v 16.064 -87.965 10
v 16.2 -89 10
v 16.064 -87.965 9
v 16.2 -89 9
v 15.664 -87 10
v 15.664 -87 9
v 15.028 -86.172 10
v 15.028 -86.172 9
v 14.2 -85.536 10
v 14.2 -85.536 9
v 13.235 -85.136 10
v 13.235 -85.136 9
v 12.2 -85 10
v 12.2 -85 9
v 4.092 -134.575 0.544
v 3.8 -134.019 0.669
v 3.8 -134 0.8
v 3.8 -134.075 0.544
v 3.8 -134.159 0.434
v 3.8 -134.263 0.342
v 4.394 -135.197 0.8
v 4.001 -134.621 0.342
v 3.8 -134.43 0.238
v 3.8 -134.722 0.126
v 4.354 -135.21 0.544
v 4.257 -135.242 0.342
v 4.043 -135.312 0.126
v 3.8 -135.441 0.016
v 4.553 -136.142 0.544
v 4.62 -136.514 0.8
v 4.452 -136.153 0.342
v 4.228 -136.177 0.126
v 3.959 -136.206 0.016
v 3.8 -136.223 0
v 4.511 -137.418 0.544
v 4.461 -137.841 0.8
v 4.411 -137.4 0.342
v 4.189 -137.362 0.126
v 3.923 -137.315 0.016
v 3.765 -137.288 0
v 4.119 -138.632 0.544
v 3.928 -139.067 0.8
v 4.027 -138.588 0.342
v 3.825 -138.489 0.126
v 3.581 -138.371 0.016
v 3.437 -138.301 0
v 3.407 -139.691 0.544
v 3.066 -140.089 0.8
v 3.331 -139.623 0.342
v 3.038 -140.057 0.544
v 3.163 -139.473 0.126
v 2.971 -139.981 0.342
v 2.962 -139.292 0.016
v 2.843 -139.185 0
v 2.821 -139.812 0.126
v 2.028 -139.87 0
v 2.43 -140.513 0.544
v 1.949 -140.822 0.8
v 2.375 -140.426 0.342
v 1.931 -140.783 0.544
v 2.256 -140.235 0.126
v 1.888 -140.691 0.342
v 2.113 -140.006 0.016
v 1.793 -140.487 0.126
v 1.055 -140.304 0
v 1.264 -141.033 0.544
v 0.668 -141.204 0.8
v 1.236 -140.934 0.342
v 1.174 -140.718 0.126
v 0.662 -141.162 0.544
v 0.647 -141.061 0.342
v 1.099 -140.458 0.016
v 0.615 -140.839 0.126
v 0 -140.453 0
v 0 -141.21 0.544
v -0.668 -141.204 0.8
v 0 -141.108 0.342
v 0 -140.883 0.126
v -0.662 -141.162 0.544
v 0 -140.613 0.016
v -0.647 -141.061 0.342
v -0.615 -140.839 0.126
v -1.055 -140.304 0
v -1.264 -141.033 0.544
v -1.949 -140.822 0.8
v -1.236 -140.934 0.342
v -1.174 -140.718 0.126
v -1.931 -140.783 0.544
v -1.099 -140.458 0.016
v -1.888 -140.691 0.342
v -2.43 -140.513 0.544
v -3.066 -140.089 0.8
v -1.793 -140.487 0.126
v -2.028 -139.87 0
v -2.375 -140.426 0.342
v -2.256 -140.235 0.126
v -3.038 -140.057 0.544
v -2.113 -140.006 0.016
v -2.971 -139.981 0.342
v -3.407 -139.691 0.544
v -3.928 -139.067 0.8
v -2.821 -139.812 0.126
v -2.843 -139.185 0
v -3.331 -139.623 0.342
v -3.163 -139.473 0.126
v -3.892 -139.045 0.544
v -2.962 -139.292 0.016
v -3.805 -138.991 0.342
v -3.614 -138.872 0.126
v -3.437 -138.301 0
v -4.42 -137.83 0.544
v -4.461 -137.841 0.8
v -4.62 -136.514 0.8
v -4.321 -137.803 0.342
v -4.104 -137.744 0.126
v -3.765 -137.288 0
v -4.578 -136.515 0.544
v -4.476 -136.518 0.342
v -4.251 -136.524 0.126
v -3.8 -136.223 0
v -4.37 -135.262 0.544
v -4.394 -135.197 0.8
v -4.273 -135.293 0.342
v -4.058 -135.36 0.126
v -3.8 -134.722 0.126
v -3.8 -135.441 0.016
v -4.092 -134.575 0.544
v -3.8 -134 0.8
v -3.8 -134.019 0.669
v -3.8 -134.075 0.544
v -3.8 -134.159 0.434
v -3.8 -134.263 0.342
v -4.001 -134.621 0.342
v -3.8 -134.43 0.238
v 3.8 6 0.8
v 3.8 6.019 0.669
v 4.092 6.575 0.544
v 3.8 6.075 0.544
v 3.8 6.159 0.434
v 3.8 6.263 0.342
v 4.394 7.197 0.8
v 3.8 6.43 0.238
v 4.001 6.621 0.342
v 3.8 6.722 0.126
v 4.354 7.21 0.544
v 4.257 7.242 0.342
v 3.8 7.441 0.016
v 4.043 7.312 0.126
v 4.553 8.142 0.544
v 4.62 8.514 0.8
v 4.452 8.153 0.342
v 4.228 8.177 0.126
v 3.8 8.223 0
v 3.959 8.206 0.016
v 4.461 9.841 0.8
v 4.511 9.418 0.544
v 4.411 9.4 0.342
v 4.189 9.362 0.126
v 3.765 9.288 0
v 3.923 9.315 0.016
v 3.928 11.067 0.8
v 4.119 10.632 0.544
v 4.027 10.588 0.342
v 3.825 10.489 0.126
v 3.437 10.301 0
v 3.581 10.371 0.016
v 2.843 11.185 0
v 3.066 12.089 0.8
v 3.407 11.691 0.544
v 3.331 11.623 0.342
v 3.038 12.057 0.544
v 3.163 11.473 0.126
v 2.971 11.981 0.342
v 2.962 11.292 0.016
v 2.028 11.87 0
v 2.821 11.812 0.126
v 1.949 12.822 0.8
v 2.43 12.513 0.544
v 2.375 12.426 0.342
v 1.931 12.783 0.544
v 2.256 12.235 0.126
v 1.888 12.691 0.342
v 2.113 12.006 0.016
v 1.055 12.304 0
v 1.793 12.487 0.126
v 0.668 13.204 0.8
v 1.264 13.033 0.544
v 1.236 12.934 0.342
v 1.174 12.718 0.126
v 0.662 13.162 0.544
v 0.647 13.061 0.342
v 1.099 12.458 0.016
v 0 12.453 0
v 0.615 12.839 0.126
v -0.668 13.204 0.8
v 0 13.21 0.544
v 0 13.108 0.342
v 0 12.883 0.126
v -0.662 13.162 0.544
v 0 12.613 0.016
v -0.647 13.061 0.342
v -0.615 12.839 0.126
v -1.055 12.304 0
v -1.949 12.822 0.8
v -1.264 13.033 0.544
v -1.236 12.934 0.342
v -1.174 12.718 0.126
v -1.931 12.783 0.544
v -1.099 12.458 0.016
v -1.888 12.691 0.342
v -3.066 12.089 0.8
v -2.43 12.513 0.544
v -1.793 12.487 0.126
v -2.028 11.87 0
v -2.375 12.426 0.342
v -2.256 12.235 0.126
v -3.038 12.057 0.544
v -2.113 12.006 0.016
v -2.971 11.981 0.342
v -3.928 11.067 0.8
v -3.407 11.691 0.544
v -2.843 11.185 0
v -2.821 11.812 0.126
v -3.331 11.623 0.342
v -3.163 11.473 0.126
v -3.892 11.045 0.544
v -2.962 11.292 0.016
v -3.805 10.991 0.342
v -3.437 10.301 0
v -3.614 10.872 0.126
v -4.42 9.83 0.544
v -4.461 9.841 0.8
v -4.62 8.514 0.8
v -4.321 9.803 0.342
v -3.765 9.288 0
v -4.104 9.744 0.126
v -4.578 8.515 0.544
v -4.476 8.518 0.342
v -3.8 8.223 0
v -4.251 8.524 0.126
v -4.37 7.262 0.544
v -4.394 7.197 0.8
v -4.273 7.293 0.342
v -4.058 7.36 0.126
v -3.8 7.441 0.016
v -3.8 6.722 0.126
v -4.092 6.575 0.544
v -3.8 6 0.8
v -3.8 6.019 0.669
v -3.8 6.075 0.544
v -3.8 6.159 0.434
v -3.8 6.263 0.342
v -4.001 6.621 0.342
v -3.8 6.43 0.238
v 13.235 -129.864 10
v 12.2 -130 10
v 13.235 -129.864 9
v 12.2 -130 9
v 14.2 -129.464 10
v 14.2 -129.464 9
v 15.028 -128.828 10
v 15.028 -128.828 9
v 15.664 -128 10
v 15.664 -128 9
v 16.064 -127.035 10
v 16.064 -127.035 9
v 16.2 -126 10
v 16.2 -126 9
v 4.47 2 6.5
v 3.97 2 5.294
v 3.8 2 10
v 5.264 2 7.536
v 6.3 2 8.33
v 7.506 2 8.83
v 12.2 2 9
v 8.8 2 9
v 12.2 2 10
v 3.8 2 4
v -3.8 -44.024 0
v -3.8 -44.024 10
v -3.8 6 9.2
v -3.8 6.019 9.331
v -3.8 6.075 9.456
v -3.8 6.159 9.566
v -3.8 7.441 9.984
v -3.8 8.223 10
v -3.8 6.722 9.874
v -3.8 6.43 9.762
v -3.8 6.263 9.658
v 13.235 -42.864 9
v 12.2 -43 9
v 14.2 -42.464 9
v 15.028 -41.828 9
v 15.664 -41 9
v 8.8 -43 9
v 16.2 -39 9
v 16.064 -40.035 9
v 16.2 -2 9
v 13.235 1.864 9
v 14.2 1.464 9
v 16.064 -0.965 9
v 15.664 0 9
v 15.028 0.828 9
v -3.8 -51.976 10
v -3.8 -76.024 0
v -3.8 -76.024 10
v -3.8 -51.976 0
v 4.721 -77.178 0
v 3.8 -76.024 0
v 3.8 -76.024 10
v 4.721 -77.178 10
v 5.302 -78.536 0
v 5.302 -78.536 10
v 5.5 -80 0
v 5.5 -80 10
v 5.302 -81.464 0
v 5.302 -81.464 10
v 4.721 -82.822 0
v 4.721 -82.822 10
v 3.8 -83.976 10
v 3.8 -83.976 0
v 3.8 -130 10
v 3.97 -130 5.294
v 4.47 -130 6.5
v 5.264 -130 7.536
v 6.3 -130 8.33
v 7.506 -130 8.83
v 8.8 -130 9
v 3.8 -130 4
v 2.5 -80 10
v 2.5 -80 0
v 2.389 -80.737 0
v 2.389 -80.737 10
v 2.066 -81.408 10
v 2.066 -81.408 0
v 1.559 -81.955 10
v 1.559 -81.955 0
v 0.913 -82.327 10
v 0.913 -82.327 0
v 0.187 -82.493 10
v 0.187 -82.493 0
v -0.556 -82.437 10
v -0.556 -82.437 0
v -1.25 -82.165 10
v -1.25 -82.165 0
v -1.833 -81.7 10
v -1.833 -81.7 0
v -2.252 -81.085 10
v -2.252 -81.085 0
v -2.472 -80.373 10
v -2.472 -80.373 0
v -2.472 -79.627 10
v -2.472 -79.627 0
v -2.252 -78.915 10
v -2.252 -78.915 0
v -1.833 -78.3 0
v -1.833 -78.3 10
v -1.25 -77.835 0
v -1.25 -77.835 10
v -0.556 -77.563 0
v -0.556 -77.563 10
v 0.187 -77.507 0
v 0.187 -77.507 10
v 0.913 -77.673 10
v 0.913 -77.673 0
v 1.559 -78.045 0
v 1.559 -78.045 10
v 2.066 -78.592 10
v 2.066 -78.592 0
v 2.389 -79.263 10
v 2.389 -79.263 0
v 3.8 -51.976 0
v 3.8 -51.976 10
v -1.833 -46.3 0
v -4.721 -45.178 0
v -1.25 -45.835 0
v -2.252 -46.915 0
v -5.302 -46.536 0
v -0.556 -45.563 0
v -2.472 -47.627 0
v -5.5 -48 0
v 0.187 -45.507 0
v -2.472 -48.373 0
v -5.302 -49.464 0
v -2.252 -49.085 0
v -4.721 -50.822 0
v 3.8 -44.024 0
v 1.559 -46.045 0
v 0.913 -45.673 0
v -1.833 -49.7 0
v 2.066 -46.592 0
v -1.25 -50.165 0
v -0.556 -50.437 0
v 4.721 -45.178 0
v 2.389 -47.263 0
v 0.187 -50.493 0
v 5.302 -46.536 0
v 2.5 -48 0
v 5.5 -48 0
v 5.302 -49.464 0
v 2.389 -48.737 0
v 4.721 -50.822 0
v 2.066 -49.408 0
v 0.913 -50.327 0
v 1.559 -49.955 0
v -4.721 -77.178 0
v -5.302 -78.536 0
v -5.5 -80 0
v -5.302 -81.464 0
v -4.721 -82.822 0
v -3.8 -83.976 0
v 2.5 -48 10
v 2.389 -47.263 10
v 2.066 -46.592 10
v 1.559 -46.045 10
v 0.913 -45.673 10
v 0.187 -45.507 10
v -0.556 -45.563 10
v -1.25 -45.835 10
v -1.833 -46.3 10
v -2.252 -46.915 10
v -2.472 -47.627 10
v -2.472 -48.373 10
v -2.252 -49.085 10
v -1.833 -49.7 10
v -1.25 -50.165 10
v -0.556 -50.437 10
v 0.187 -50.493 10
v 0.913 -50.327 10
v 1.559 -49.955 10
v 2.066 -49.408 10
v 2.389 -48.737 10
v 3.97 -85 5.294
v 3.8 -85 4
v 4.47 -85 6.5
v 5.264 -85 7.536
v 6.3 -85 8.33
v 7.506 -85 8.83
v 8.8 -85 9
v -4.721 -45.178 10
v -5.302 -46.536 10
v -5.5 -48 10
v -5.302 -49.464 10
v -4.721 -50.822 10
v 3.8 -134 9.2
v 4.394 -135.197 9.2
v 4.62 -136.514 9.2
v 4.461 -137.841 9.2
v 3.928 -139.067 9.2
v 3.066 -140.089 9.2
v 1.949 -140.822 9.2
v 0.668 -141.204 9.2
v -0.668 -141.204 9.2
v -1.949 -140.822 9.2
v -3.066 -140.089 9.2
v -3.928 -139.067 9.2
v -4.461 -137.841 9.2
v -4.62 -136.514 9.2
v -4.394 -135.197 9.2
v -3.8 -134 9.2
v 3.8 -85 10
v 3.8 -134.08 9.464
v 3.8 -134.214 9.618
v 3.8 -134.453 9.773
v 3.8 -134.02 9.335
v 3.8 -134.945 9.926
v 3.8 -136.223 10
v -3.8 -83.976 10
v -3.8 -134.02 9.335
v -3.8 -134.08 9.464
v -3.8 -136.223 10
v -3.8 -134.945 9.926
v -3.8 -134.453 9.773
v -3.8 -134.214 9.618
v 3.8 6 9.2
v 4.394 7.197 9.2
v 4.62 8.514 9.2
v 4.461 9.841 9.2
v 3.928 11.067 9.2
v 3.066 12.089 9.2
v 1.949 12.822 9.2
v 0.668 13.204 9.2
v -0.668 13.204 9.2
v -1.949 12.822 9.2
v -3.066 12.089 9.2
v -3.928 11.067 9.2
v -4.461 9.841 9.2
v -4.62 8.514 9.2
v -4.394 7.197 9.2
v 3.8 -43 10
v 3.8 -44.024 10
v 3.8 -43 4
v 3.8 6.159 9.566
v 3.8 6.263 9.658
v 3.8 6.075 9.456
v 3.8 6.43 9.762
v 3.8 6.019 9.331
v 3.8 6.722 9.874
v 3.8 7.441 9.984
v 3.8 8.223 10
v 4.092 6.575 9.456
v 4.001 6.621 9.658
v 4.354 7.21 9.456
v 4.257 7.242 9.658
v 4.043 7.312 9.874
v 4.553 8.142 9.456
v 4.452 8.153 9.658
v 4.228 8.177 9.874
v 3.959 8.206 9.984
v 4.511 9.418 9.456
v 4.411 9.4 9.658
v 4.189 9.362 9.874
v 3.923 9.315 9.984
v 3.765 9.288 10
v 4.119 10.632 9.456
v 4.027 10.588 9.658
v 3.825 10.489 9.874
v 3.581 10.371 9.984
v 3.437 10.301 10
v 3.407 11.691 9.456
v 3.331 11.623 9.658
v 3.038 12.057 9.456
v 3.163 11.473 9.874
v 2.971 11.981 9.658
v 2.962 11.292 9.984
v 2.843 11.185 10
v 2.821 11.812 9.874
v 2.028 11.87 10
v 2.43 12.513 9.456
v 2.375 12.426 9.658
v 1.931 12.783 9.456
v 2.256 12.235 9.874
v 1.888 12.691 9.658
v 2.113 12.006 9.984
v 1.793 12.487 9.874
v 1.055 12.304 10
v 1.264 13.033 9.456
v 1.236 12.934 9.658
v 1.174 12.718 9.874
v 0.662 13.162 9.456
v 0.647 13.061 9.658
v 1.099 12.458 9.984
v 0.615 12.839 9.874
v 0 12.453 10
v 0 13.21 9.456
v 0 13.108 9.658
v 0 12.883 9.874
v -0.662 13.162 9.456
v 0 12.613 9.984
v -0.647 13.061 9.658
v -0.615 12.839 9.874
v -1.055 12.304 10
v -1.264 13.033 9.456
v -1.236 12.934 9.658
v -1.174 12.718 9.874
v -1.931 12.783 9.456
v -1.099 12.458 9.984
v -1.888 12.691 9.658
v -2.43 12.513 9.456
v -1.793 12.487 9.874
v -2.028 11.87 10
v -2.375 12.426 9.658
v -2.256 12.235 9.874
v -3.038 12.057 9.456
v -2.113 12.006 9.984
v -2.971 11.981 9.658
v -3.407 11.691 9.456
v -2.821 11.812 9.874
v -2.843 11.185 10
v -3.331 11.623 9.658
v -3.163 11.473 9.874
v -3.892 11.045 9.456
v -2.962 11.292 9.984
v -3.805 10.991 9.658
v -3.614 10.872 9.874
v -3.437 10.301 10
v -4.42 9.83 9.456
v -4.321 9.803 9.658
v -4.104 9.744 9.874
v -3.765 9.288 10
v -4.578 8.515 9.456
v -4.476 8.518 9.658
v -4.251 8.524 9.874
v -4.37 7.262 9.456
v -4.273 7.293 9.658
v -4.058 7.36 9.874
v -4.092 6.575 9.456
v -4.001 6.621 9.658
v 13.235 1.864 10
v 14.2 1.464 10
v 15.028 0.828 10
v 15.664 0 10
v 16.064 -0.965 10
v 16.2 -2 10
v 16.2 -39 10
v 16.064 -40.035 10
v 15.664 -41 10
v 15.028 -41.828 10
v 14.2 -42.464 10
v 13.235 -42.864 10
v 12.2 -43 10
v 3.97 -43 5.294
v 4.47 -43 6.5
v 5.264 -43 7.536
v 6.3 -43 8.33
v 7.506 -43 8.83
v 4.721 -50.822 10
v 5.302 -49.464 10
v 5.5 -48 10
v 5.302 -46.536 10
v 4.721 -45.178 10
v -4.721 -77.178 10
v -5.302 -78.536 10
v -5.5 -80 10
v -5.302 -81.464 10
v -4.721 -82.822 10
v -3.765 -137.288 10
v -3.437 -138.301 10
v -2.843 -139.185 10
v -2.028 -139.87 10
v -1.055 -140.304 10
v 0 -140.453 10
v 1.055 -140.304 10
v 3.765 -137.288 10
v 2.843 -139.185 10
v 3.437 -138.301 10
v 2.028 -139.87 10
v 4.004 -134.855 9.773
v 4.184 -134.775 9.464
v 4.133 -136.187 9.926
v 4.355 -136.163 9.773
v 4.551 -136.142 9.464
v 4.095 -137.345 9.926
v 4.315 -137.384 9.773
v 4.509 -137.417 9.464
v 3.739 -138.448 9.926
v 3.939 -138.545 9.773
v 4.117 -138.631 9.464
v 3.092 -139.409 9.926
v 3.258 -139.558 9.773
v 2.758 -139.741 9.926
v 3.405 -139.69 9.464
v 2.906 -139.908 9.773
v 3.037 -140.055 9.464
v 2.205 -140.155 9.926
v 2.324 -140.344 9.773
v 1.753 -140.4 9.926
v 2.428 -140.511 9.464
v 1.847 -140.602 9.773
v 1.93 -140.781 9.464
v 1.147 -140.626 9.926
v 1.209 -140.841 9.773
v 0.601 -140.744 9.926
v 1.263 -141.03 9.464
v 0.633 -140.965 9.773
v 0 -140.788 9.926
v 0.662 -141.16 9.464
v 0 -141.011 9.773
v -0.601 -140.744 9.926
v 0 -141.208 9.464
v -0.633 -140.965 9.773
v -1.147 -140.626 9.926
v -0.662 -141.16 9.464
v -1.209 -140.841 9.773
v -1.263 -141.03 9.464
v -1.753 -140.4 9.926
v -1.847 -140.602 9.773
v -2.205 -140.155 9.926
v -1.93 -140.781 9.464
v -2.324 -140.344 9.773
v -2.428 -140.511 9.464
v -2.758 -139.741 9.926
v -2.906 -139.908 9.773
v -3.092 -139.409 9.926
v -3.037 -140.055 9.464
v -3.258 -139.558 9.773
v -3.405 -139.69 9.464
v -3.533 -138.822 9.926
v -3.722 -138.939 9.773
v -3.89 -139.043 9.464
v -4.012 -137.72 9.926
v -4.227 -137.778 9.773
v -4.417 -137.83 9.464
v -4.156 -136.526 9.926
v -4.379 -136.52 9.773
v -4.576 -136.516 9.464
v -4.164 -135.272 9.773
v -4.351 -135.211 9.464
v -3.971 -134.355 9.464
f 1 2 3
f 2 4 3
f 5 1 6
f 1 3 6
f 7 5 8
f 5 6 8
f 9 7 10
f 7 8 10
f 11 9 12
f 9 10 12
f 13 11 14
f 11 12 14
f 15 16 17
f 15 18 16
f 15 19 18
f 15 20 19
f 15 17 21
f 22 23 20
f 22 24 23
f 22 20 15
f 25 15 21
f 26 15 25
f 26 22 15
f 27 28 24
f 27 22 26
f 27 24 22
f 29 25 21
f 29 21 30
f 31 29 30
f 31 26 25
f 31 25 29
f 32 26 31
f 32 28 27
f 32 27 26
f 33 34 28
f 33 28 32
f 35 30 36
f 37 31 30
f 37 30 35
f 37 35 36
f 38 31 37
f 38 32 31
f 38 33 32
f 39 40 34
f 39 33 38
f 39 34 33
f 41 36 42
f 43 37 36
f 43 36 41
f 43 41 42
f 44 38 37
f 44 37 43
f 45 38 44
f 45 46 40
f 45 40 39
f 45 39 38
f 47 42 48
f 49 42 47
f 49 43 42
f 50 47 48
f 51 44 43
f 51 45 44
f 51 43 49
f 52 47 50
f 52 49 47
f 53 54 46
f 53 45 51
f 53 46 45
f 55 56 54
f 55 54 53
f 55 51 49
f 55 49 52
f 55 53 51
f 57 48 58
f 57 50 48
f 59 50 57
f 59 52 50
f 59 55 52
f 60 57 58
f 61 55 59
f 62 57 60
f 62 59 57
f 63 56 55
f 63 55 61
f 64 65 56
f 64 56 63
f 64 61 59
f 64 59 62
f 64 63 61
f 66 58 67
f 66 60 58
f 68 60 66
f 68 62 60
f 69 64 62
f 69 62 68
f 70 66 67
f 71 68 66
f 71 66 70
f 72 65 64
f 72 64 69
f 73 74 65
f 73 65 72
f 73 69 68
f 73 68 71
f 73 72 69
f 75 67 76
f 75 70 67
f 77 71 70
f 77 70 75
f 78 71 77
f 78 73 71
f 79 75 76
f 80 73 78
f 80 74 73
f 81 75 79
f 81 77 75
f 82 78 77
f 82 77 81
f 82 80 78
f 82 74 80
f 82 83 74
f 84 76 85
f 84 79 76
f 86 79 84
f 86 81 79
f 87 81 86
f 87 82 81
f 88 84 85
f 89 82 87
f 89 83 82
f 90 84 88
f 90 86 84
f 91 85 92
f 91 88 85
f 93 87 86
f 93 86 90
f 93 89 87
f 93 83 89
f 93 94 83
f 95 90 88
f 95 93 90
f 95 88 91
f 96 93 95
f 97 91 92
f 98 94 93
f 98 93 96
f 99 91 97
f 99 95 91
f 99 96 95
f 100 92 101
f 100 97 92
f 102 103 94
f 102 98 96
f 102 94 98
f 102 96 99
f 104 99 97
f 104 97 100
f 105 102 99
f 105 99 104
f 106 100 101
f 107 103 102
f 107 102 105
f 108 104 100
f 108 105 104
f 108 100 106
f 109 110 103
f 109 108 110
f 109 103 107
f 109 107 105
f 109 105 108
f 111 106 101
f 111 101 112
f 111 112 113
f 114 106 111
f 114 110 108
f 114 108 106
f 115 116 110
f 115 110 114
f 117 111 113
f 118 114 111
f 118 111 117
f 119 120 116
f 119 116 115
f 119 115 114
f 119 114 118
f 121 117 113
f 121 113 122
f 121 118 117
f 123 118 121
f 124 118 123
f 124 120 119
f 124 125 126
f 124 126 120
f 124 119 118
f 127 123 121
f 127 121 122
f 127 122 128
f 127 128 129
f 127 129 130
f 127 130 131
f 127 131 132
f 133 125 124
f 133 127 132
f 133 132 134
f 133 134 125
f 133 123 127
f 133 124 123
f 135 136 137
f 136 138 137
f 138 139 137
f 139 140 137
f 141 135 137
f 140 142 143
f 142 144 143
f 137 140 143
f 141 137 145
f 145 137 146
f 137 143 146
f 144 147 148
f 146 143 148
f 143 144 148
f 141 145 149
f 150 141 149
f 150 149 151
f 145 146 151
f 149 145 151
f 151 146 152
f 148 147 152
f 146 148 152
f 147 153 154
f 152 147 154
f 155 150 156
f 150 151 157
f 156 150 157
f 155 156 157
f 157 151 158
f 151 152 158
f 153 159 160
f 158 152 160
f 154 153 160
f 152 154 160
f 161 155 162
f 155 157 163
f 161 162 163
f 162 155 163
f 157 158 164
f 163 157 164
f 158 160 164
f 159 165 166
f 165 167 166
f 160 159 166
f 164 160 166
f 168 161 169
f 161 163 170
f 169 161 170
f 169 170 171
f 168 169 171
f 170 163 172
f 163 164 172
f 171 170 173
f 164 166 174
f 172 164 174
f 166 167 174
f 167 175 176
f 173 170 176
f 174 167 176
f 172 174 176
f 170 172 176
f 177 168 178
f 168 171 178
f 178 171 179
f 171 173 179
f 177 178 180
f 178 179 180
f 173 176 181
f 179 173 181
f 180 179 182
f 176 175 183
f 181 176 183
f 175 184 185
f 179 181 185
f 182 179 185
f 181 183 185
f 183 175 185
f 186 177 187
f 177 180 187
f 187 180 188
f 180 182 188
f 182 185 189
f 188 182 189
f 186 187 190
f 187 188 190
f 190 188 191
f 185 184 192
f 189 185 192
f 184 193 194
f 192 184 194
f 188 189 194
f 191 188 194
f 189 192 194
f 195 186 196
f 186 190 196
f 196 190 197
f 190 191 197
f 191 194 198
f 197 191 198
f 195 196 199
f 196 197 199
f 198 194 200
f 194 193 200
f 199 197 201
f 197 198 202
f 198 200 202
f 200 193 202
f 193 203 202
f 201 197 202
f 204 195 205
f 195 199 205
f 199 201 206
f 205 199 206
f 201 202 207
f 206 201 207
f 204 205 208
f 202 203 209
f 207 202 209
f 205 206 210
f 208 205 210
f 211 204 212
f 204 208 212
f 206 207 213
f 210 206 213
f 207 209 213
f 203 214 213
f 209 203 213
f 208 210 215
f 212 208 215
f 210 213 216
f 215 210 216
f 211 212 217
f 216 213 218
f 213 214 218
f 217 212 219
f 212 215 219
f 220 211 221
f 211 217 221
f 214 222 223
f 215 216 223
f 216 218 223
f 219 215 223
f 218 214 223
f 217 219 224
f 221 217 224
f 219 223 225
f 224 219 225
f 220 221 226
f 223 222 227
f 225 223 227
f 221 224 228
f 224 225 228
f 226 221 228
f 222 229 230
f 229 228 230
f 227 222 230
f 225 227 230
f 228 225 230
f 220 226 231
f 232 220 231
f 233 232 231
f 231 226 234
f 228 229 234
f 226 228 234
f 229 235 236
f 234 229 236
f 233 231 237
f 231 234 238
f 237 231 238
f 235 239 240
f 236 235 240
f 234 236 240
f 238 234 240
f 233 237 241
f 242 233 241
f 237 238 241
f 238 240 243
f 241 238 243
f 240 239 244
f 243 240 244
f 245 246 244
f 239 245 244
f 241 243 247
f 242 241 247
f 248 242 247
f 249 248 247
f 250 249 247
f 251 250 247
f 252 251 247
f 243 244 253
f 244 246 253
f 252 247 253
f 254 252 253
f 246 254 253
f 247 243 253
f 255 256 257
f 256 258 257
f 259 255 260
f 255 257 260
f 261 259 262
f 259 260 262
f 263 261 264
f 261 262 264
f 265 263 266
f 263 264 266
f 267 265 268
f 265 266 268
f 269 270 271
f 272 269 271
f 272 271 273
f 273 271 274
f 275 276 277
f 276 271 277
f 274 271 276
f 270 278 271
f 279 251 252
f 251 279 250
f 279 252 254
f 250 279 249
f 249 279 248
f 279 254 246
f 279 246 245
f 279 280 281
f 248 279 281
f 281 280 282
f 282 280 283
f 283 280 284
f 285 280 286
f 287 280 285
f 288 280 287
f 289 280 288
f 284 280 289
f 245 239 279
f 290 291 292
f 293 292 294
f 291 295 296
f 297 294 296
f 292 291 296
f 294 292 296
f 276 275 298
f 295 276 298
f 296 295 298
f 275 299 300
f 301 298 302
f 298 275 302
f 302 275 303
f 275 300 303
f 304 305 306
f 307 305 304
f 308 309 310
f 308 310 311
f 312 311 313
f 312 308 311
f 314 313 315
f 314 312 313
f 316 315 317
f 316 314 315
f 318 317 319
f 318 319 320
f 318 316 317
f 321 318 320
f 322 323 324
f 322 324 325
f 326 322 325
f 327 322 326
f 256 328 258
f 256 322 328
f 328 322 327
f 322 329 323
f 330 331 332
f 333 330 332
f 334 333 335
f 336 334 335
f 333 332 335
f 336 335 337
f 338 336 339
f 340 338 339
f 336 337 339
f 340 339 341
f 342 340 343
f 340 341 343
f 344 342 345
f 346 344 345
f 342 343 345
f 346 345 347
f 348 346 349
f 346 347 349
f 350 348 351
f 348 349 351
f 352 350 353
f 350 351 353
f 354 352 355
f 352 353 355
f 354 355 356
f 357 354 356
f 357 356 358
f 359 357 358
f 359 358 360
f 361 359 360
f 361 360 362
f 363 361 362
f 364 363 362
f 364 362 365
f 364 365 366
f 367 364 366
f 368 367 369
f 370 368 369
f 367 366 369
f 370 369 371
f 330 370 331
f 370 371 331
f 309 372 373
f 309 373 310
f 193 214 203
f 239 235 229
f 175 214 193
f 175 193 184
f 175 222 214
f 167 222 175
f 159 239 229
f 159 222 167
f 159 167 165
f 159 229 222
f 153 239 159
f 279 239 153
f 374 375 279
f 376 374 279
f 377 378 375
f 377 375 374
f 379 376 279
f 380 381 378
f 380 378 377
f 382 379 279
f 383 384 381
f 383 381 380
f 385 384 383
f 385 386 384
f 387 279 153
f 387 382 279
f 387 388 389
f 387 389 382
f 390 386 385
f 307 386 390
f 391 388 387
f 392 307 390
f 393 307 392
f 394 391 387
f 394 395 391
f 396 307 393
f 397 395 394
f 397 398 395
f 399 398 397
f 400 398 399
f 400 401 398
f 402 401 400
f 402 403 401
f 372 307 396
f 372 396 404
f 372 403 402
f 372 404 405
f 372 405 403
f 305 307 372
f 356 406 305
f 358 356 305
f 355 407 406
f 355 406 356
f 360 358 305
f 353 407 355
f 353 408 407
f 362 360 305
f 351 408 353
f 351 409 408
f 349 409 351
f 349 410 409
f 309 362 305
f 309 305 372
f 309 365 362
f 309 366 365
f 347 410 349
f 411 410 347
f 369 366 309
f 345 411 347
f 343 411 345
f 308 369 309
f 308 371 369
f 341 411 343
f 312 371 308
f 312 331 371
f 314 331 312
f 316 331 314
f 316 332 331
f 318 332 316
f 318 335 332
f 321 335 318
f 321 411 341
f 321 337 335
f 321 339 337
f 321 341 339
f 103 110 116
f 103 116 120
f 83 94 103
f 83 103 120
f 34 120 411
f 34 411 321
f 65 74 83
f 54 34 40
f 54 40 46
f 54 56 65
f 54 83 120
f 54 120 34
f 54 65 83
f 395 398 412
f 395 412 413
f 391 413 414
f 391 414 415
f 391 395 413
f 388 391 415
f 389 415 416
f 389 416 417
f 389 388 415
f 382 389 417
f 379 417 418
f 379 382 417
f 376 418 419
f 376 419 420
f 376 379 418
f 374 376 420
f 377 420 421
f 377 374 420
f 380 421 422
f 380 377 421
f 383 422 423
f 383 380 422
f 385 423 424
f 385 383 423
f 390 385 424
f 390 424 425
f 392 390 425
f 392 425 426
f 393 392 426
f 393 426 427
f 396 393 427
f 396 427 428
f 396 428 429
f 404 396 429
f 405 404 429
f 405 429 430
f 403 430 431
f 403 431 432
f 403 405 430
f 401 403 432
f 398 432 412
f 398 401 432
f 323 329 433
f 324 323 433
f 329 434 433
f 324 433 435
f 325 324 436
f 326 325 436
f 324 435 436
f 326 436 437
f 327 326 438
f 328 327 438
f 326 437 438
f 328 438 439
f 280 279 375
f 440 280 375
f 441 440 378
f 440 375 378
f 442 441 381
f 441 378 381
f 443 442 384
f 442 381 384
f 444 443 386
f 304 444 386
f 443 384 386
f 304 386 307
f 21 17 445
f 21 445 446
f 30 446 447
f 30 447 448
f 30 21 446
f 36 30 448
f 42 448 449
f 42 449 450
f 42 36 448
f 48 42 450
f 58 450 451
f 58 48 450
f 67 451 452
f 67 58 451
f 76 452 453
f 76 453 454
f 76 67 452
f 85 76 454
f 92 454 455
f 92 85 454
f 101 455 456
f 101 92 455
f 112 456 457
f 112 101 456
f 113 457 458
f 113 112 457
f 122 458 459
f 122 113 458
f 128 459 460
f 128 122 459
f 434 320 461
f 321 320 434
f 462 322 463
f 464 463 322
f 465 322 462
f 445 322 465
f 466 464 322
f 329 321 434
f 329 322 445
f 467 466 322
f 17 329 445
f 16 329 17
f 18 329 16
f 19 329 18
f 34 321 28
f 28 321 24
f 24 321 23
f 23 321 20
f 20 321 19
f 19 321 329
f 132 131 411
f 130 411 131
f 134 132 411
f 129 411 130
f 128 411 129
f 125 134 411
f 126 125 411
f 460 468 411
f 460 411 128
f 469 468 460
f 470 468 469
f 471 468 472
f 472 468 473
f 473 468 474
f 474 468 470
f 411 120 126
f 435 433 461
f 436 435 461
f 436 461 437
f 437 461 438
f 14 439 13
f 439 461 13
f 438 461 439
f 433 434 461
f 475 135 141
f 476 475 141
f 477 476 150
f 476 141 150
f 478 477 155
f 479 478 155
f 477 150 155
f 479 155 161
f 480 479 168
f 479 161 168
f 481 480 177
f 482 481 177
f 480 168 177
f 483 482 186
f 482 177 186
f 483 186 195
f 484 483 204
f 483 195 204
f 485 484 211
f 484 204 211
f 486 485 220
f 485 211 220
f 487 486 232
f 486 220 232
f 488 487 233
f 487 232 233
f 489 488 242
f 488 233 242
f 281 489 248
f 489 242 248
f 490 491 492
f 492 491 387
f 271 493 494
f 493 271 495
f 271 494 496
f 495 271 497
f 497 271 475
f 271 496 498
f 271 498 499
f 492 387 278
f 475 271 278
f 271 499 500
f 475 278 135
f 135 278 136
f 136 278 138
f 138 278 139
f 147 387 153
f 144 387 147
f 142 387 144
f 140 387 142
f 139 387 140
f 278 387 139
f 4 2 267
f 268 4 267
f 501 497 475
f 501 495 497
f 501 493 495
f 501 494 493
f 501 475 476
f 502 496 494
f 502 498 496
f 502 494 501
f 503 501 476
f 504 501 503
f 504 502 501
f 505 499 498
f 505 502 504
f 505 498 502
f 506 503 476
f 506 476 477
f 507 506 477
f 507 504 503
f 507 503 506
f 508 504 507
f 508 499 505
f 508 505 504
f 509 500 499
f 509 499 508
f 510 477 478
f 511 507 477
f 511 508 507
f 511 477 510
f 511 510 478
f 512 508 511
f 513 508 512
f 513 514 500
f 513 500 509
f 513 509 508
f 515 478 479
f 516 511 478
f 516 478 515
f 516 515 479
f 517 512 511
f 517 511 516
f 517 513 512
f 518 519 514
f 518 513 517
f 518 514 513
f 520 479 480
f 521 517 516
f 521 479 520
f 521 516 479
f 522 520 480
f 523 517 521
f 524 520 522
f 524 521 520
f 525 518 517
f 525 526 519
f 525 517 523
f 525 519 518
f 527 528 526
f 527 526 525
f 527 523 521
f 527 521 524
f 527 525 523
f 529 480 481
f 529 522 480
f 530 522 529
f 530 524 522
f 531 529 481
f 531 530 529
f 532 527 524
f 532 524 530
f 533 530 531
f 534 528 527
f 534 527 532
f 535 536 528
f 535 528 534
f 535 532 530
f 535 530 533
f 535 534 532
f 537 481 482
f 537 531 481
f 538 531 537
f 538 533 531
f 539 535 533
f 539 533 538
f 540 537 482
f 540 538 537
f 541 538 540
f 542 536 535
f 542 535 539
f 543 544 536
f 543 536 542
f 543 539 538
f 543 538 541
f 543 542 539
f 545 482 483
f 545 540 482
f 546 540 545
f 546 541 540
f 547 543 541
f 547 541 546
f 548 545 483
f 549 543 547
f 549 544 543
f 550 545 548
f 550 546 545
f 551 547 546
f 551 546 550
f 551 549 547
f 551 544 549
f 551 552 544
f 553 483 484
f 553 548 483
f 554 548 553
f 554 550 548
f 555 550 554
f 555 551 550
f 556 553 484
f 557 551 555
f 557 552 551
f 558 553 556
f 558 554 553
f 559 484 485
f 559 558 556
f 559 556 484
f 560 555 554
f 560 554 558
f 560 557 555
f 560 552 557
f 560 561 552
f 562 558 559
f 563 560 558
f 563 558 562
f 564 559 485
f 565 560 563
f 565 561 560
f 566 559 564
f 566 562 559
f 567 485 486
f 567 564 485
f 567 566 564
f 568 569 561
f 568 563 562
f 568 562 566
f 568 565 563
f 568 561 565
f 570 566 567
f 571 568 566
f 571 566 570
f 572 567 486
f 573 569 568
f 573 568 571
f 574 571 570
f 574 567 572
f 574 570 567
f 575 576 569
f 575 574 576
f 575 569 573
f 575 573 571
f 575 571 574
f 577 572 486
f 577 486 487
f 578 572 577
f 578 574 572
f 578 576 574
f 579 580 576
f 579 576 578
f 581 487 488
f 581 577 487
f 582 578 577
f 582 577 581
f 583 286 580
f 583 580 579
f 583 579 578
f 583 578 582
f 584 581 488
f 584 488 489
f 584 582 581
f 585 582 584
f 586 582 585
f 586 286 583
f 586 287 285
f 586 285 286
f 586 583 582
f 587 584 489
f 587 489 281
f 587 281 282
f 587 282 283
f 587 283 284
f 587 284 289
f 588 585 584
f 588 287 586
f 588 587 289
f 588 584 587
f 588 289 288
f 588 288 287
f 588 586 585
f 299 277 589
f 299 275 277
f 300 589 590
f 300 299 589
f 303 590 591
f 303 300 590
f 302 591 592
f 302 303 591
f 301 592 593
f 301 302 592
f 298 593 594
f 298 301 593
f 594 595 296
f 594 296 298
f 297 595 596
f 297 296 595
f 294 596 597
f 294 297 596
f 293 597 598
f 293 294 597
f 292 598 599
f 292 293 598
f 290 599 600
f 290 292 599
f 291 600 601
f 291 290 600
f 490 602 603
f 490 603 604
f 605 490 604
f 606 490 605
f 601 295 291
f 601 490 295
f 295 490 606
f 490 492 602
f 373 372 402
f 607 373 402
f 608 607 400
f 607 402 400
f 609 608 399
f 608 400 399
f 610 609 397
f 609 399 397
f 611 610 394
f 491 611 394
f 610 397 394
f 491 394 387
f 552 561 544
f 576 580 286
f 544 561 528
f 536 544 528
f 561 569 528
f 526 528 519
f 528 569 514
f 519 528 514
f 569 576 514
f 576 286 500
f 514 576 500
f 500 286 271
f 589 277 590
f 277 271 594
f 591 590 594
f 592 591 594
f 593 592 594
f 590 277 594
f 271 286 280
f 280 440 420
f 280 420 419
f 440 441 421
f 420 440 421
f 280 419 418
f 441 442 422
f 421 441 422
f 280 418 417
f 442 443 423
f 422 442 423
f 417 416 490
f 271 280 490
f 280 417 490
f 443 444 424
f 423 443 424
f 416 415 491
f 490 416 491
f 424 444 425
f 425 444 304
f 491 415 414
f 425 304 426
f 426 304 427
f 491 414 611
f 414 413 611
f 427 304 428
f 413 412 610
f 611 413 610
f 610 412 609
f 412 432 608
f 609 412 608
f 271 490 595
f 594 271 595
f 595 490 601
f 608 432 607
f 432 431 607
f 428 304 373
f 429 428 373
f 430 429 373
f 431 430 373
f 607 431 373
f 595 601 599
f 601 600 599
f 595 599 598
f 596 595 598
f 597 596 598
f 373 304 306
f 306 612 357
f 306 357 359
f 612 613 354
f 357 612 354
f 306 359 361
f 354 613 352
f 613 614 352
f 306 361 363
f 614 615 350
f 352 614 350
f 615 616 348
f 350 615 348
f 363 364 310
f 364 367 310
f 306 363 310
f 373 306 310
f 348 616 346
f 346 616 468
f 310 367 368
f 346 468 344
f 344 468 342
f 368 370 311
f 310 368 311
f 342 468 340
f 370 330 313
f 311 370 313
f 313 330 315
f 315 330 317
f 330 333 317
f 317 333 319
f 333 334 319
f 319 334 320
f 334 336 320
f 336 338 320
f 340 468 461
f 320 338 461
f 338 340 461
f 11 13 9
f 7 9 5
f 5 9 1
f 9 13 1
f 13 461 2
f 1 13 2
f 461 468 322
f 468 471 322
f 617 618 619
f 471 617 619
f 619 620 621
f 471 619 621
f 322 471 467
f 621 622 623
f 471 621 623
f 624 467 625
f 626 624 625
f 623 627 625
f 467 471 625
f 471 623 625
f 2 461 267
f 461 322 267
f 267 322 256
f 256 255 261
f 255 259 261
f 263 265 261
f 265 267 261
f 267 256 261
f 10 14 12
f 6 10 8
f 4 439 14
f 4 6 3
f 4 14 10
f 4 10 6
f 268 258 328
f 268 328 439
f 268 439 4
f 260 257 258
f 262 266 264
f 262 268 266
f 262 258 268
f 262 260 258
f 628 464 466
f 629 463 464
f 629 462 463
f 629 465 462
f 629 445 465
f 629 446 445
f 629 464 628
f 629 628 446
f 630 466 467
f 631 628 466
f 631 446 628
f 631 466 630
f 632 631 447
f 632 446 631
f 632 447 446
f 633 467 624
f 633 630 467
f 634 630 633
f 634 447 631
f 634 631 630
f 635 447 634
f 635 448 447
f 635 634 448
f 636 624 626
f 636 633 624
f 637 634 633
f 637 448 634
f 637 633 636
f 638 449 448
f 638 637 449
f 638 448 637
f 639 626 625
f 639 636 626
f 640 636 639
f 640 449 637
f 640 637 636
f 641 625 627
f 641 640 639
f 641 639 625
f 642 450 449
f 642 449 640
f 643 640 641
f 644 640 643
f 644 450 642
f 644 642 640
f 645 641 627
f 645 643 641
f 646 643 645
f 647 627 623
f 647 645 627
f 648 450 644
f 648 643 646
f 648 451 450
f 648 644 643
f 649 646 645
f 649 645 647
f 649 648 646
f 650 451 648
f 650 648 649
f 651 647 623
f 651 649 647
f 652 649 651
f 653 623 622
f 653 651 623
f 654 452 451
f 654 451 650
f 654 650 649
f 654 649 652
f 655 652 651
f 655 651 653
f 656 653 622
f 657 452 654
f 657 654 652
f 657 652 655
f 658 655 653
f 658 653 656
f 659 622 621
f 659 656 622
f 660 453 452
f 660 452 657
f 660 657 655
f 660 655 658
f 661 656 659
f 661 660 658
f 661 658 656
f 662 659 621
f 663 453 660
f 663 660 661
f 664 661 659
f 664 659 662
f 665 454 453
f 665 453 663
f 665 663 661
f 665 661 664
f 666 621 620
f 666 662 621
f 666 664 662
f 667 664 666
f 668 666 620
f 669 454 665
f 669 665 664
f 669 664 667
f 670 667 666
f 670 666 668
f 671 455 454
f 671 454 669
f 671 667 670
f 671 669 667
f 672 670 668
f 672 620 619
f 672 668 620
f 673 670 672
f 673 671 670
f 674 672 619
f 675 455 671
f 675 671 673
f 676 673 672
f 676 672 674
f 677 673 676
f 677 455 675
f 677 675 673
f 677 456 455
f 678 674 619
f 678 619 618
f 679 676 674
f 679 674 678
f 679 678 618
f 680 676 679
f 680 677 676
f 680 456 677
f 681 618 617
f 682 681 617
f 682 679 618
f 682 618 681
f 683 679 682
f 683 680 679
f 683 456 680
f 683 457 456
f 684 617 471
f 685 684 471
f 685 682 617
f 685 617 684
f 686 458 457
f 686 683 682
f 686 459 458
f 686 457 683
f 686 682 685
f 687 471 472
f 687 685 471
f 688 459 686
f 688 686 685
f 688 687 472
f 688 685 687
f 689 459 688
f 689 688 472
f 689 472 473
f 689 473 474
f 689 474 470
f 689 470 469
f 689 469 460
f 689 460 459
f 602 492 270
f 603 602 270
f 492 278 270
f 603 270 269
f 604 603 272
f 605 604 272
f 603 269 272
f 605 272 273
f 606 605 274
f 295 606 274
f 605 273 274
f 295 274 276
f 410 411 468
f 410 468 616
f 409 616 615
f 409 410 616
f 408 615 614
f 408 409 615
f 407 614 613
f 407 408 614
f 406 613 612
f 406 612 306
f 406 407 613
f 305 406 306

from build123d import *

# Parameters (mm, degrees)
SKETCH1_R            = 2.5
BOSS_EXTRUDE1_DEPTH  = 10
SKETCH4_W            = 20
SKETCH4_H            = 45
BOSS_EXTRUDE2_DEPTH  = 1
FILLET3_R            = 0.8
FILLET2_R            = 4
FILLET1_R            = 5
FILLET3_OF_MIRROR1_R = 0.8
FILLET2_OF_MIRROR1_R = 4
FILLET1_OF_MIRROR1_R = 5


with BuildPart() as part:
    # Sketch1 → Boss-Extrude1 (new body)
    with BuildSketch(Plane.XY):
        with BuildLine():
            Line((-3.8, 6), (-3.8, -44.02382093))
            ThreePointArc((-3.8, -44.02382093), (-5.5, -48), (-3.8, -51.97617907))
            Line((-3.8, -51.97617907), (-3.8, -64))
            Line((-3.8, -64), (3.8, -64))
            Line((3.8, -64), (3.8, -51.97617907))
            ThreePointArc((3.8, -51.97617907), (5.5, -48), (3.8, -44.02382093))
            Line((3.8, -44.02382093), (3.8, 6))
            ThreePointArc((3.8, 6), (0, 13.252645761), (-3.8, 6))
        make_face()
        with Locations((0, -48)):
            Circle(SKETCH1_R, mode=Mode.SUBTRACT)
    boss_extrude1 = extrude(amount=BOSS_EXTRUDE1_DEPTH)

    # Sketch4 → Boss-Extrude2 (add)
    with BuildSketch(Plane.XY.offset(10)):
        with Locations((6.2, -20.5)):
            Rectangle(SKETCH4_W, SKETCH4_H)
    boss_extrude2 = extrude(amount=-BOSS_EXTRUDE2_DEPTH)

    # Fillet3
    fillet3_edges = [part.edges().sort_by_distance(p)[0] for p in [
        (0, 13.252645761, 0),
        (0, 13.252645761, 10),
    ]]
    fillet(fillet3_edges, radius=FILLET3_R)

    # Fillet2
    fillet2_edges = [part.edges().sort_by_distance(p)[0] for p in [
        (16.2, -43, 9.5),
        (16.2, 2, 9.5),
    ]]
    fillet(fillet2_edges, radius=FILLET2_R)

    # Fillet1
    fillet1_edges = [part.edges().sort_by_distance(p)[0] for p in [
        (3.8, -20.5, 9),
    ]]
    fillet(fillet1_edges, radius=FILLET1_R)

    # Mirror1: Boss-Extrude1, Boss-Extrude2 across plane
    add(boss_extrude1.mirror(Plane(origin=(0, -64, 0), x_dir=(0, 0, 1), z_dir=(0, -1, 0))))
    add(boss_extrude2.mirror(Plane(origin=(0, -64, 0), x_dir=(0, 0, 1), z_dir=(0, -1, 0))))

    # Fillet3 of Mirror1
    fillet3_of_mirror1_edges = [part.edges().sort_by_distance(p)[0] for p in [
        (0, -141.252645761, 0),
        (0, -141.252645761, 10),
    ]]
    fillet(fillet3_of_mirror1_edges, radius=FILLET3_OF_MIRROR1_R)

    # Fillet2 of Mirror1
    fillet2_of_mirror1_edges = [part.edges().sort_by_distance(p)[0] for p in [
        (16.2, -85, 9.5),
        (16.2, -130, 9.5),
    ]]
    fillet(fillet2_of_mirror1_edges, radius=FILLET2_OF_MIRROR1_R)

    # Fillet1 of Mirror1
    fillet1_of_mirror1_edges = [part.edges().sort_by_distance(p)[0] for p in [
        (3.8, -107.5, 9),
    ]]
    fillet(fillet1_of_mirror1_edges, radius=FILLET1_OF_MIRROR1_R)


solid = part.part
